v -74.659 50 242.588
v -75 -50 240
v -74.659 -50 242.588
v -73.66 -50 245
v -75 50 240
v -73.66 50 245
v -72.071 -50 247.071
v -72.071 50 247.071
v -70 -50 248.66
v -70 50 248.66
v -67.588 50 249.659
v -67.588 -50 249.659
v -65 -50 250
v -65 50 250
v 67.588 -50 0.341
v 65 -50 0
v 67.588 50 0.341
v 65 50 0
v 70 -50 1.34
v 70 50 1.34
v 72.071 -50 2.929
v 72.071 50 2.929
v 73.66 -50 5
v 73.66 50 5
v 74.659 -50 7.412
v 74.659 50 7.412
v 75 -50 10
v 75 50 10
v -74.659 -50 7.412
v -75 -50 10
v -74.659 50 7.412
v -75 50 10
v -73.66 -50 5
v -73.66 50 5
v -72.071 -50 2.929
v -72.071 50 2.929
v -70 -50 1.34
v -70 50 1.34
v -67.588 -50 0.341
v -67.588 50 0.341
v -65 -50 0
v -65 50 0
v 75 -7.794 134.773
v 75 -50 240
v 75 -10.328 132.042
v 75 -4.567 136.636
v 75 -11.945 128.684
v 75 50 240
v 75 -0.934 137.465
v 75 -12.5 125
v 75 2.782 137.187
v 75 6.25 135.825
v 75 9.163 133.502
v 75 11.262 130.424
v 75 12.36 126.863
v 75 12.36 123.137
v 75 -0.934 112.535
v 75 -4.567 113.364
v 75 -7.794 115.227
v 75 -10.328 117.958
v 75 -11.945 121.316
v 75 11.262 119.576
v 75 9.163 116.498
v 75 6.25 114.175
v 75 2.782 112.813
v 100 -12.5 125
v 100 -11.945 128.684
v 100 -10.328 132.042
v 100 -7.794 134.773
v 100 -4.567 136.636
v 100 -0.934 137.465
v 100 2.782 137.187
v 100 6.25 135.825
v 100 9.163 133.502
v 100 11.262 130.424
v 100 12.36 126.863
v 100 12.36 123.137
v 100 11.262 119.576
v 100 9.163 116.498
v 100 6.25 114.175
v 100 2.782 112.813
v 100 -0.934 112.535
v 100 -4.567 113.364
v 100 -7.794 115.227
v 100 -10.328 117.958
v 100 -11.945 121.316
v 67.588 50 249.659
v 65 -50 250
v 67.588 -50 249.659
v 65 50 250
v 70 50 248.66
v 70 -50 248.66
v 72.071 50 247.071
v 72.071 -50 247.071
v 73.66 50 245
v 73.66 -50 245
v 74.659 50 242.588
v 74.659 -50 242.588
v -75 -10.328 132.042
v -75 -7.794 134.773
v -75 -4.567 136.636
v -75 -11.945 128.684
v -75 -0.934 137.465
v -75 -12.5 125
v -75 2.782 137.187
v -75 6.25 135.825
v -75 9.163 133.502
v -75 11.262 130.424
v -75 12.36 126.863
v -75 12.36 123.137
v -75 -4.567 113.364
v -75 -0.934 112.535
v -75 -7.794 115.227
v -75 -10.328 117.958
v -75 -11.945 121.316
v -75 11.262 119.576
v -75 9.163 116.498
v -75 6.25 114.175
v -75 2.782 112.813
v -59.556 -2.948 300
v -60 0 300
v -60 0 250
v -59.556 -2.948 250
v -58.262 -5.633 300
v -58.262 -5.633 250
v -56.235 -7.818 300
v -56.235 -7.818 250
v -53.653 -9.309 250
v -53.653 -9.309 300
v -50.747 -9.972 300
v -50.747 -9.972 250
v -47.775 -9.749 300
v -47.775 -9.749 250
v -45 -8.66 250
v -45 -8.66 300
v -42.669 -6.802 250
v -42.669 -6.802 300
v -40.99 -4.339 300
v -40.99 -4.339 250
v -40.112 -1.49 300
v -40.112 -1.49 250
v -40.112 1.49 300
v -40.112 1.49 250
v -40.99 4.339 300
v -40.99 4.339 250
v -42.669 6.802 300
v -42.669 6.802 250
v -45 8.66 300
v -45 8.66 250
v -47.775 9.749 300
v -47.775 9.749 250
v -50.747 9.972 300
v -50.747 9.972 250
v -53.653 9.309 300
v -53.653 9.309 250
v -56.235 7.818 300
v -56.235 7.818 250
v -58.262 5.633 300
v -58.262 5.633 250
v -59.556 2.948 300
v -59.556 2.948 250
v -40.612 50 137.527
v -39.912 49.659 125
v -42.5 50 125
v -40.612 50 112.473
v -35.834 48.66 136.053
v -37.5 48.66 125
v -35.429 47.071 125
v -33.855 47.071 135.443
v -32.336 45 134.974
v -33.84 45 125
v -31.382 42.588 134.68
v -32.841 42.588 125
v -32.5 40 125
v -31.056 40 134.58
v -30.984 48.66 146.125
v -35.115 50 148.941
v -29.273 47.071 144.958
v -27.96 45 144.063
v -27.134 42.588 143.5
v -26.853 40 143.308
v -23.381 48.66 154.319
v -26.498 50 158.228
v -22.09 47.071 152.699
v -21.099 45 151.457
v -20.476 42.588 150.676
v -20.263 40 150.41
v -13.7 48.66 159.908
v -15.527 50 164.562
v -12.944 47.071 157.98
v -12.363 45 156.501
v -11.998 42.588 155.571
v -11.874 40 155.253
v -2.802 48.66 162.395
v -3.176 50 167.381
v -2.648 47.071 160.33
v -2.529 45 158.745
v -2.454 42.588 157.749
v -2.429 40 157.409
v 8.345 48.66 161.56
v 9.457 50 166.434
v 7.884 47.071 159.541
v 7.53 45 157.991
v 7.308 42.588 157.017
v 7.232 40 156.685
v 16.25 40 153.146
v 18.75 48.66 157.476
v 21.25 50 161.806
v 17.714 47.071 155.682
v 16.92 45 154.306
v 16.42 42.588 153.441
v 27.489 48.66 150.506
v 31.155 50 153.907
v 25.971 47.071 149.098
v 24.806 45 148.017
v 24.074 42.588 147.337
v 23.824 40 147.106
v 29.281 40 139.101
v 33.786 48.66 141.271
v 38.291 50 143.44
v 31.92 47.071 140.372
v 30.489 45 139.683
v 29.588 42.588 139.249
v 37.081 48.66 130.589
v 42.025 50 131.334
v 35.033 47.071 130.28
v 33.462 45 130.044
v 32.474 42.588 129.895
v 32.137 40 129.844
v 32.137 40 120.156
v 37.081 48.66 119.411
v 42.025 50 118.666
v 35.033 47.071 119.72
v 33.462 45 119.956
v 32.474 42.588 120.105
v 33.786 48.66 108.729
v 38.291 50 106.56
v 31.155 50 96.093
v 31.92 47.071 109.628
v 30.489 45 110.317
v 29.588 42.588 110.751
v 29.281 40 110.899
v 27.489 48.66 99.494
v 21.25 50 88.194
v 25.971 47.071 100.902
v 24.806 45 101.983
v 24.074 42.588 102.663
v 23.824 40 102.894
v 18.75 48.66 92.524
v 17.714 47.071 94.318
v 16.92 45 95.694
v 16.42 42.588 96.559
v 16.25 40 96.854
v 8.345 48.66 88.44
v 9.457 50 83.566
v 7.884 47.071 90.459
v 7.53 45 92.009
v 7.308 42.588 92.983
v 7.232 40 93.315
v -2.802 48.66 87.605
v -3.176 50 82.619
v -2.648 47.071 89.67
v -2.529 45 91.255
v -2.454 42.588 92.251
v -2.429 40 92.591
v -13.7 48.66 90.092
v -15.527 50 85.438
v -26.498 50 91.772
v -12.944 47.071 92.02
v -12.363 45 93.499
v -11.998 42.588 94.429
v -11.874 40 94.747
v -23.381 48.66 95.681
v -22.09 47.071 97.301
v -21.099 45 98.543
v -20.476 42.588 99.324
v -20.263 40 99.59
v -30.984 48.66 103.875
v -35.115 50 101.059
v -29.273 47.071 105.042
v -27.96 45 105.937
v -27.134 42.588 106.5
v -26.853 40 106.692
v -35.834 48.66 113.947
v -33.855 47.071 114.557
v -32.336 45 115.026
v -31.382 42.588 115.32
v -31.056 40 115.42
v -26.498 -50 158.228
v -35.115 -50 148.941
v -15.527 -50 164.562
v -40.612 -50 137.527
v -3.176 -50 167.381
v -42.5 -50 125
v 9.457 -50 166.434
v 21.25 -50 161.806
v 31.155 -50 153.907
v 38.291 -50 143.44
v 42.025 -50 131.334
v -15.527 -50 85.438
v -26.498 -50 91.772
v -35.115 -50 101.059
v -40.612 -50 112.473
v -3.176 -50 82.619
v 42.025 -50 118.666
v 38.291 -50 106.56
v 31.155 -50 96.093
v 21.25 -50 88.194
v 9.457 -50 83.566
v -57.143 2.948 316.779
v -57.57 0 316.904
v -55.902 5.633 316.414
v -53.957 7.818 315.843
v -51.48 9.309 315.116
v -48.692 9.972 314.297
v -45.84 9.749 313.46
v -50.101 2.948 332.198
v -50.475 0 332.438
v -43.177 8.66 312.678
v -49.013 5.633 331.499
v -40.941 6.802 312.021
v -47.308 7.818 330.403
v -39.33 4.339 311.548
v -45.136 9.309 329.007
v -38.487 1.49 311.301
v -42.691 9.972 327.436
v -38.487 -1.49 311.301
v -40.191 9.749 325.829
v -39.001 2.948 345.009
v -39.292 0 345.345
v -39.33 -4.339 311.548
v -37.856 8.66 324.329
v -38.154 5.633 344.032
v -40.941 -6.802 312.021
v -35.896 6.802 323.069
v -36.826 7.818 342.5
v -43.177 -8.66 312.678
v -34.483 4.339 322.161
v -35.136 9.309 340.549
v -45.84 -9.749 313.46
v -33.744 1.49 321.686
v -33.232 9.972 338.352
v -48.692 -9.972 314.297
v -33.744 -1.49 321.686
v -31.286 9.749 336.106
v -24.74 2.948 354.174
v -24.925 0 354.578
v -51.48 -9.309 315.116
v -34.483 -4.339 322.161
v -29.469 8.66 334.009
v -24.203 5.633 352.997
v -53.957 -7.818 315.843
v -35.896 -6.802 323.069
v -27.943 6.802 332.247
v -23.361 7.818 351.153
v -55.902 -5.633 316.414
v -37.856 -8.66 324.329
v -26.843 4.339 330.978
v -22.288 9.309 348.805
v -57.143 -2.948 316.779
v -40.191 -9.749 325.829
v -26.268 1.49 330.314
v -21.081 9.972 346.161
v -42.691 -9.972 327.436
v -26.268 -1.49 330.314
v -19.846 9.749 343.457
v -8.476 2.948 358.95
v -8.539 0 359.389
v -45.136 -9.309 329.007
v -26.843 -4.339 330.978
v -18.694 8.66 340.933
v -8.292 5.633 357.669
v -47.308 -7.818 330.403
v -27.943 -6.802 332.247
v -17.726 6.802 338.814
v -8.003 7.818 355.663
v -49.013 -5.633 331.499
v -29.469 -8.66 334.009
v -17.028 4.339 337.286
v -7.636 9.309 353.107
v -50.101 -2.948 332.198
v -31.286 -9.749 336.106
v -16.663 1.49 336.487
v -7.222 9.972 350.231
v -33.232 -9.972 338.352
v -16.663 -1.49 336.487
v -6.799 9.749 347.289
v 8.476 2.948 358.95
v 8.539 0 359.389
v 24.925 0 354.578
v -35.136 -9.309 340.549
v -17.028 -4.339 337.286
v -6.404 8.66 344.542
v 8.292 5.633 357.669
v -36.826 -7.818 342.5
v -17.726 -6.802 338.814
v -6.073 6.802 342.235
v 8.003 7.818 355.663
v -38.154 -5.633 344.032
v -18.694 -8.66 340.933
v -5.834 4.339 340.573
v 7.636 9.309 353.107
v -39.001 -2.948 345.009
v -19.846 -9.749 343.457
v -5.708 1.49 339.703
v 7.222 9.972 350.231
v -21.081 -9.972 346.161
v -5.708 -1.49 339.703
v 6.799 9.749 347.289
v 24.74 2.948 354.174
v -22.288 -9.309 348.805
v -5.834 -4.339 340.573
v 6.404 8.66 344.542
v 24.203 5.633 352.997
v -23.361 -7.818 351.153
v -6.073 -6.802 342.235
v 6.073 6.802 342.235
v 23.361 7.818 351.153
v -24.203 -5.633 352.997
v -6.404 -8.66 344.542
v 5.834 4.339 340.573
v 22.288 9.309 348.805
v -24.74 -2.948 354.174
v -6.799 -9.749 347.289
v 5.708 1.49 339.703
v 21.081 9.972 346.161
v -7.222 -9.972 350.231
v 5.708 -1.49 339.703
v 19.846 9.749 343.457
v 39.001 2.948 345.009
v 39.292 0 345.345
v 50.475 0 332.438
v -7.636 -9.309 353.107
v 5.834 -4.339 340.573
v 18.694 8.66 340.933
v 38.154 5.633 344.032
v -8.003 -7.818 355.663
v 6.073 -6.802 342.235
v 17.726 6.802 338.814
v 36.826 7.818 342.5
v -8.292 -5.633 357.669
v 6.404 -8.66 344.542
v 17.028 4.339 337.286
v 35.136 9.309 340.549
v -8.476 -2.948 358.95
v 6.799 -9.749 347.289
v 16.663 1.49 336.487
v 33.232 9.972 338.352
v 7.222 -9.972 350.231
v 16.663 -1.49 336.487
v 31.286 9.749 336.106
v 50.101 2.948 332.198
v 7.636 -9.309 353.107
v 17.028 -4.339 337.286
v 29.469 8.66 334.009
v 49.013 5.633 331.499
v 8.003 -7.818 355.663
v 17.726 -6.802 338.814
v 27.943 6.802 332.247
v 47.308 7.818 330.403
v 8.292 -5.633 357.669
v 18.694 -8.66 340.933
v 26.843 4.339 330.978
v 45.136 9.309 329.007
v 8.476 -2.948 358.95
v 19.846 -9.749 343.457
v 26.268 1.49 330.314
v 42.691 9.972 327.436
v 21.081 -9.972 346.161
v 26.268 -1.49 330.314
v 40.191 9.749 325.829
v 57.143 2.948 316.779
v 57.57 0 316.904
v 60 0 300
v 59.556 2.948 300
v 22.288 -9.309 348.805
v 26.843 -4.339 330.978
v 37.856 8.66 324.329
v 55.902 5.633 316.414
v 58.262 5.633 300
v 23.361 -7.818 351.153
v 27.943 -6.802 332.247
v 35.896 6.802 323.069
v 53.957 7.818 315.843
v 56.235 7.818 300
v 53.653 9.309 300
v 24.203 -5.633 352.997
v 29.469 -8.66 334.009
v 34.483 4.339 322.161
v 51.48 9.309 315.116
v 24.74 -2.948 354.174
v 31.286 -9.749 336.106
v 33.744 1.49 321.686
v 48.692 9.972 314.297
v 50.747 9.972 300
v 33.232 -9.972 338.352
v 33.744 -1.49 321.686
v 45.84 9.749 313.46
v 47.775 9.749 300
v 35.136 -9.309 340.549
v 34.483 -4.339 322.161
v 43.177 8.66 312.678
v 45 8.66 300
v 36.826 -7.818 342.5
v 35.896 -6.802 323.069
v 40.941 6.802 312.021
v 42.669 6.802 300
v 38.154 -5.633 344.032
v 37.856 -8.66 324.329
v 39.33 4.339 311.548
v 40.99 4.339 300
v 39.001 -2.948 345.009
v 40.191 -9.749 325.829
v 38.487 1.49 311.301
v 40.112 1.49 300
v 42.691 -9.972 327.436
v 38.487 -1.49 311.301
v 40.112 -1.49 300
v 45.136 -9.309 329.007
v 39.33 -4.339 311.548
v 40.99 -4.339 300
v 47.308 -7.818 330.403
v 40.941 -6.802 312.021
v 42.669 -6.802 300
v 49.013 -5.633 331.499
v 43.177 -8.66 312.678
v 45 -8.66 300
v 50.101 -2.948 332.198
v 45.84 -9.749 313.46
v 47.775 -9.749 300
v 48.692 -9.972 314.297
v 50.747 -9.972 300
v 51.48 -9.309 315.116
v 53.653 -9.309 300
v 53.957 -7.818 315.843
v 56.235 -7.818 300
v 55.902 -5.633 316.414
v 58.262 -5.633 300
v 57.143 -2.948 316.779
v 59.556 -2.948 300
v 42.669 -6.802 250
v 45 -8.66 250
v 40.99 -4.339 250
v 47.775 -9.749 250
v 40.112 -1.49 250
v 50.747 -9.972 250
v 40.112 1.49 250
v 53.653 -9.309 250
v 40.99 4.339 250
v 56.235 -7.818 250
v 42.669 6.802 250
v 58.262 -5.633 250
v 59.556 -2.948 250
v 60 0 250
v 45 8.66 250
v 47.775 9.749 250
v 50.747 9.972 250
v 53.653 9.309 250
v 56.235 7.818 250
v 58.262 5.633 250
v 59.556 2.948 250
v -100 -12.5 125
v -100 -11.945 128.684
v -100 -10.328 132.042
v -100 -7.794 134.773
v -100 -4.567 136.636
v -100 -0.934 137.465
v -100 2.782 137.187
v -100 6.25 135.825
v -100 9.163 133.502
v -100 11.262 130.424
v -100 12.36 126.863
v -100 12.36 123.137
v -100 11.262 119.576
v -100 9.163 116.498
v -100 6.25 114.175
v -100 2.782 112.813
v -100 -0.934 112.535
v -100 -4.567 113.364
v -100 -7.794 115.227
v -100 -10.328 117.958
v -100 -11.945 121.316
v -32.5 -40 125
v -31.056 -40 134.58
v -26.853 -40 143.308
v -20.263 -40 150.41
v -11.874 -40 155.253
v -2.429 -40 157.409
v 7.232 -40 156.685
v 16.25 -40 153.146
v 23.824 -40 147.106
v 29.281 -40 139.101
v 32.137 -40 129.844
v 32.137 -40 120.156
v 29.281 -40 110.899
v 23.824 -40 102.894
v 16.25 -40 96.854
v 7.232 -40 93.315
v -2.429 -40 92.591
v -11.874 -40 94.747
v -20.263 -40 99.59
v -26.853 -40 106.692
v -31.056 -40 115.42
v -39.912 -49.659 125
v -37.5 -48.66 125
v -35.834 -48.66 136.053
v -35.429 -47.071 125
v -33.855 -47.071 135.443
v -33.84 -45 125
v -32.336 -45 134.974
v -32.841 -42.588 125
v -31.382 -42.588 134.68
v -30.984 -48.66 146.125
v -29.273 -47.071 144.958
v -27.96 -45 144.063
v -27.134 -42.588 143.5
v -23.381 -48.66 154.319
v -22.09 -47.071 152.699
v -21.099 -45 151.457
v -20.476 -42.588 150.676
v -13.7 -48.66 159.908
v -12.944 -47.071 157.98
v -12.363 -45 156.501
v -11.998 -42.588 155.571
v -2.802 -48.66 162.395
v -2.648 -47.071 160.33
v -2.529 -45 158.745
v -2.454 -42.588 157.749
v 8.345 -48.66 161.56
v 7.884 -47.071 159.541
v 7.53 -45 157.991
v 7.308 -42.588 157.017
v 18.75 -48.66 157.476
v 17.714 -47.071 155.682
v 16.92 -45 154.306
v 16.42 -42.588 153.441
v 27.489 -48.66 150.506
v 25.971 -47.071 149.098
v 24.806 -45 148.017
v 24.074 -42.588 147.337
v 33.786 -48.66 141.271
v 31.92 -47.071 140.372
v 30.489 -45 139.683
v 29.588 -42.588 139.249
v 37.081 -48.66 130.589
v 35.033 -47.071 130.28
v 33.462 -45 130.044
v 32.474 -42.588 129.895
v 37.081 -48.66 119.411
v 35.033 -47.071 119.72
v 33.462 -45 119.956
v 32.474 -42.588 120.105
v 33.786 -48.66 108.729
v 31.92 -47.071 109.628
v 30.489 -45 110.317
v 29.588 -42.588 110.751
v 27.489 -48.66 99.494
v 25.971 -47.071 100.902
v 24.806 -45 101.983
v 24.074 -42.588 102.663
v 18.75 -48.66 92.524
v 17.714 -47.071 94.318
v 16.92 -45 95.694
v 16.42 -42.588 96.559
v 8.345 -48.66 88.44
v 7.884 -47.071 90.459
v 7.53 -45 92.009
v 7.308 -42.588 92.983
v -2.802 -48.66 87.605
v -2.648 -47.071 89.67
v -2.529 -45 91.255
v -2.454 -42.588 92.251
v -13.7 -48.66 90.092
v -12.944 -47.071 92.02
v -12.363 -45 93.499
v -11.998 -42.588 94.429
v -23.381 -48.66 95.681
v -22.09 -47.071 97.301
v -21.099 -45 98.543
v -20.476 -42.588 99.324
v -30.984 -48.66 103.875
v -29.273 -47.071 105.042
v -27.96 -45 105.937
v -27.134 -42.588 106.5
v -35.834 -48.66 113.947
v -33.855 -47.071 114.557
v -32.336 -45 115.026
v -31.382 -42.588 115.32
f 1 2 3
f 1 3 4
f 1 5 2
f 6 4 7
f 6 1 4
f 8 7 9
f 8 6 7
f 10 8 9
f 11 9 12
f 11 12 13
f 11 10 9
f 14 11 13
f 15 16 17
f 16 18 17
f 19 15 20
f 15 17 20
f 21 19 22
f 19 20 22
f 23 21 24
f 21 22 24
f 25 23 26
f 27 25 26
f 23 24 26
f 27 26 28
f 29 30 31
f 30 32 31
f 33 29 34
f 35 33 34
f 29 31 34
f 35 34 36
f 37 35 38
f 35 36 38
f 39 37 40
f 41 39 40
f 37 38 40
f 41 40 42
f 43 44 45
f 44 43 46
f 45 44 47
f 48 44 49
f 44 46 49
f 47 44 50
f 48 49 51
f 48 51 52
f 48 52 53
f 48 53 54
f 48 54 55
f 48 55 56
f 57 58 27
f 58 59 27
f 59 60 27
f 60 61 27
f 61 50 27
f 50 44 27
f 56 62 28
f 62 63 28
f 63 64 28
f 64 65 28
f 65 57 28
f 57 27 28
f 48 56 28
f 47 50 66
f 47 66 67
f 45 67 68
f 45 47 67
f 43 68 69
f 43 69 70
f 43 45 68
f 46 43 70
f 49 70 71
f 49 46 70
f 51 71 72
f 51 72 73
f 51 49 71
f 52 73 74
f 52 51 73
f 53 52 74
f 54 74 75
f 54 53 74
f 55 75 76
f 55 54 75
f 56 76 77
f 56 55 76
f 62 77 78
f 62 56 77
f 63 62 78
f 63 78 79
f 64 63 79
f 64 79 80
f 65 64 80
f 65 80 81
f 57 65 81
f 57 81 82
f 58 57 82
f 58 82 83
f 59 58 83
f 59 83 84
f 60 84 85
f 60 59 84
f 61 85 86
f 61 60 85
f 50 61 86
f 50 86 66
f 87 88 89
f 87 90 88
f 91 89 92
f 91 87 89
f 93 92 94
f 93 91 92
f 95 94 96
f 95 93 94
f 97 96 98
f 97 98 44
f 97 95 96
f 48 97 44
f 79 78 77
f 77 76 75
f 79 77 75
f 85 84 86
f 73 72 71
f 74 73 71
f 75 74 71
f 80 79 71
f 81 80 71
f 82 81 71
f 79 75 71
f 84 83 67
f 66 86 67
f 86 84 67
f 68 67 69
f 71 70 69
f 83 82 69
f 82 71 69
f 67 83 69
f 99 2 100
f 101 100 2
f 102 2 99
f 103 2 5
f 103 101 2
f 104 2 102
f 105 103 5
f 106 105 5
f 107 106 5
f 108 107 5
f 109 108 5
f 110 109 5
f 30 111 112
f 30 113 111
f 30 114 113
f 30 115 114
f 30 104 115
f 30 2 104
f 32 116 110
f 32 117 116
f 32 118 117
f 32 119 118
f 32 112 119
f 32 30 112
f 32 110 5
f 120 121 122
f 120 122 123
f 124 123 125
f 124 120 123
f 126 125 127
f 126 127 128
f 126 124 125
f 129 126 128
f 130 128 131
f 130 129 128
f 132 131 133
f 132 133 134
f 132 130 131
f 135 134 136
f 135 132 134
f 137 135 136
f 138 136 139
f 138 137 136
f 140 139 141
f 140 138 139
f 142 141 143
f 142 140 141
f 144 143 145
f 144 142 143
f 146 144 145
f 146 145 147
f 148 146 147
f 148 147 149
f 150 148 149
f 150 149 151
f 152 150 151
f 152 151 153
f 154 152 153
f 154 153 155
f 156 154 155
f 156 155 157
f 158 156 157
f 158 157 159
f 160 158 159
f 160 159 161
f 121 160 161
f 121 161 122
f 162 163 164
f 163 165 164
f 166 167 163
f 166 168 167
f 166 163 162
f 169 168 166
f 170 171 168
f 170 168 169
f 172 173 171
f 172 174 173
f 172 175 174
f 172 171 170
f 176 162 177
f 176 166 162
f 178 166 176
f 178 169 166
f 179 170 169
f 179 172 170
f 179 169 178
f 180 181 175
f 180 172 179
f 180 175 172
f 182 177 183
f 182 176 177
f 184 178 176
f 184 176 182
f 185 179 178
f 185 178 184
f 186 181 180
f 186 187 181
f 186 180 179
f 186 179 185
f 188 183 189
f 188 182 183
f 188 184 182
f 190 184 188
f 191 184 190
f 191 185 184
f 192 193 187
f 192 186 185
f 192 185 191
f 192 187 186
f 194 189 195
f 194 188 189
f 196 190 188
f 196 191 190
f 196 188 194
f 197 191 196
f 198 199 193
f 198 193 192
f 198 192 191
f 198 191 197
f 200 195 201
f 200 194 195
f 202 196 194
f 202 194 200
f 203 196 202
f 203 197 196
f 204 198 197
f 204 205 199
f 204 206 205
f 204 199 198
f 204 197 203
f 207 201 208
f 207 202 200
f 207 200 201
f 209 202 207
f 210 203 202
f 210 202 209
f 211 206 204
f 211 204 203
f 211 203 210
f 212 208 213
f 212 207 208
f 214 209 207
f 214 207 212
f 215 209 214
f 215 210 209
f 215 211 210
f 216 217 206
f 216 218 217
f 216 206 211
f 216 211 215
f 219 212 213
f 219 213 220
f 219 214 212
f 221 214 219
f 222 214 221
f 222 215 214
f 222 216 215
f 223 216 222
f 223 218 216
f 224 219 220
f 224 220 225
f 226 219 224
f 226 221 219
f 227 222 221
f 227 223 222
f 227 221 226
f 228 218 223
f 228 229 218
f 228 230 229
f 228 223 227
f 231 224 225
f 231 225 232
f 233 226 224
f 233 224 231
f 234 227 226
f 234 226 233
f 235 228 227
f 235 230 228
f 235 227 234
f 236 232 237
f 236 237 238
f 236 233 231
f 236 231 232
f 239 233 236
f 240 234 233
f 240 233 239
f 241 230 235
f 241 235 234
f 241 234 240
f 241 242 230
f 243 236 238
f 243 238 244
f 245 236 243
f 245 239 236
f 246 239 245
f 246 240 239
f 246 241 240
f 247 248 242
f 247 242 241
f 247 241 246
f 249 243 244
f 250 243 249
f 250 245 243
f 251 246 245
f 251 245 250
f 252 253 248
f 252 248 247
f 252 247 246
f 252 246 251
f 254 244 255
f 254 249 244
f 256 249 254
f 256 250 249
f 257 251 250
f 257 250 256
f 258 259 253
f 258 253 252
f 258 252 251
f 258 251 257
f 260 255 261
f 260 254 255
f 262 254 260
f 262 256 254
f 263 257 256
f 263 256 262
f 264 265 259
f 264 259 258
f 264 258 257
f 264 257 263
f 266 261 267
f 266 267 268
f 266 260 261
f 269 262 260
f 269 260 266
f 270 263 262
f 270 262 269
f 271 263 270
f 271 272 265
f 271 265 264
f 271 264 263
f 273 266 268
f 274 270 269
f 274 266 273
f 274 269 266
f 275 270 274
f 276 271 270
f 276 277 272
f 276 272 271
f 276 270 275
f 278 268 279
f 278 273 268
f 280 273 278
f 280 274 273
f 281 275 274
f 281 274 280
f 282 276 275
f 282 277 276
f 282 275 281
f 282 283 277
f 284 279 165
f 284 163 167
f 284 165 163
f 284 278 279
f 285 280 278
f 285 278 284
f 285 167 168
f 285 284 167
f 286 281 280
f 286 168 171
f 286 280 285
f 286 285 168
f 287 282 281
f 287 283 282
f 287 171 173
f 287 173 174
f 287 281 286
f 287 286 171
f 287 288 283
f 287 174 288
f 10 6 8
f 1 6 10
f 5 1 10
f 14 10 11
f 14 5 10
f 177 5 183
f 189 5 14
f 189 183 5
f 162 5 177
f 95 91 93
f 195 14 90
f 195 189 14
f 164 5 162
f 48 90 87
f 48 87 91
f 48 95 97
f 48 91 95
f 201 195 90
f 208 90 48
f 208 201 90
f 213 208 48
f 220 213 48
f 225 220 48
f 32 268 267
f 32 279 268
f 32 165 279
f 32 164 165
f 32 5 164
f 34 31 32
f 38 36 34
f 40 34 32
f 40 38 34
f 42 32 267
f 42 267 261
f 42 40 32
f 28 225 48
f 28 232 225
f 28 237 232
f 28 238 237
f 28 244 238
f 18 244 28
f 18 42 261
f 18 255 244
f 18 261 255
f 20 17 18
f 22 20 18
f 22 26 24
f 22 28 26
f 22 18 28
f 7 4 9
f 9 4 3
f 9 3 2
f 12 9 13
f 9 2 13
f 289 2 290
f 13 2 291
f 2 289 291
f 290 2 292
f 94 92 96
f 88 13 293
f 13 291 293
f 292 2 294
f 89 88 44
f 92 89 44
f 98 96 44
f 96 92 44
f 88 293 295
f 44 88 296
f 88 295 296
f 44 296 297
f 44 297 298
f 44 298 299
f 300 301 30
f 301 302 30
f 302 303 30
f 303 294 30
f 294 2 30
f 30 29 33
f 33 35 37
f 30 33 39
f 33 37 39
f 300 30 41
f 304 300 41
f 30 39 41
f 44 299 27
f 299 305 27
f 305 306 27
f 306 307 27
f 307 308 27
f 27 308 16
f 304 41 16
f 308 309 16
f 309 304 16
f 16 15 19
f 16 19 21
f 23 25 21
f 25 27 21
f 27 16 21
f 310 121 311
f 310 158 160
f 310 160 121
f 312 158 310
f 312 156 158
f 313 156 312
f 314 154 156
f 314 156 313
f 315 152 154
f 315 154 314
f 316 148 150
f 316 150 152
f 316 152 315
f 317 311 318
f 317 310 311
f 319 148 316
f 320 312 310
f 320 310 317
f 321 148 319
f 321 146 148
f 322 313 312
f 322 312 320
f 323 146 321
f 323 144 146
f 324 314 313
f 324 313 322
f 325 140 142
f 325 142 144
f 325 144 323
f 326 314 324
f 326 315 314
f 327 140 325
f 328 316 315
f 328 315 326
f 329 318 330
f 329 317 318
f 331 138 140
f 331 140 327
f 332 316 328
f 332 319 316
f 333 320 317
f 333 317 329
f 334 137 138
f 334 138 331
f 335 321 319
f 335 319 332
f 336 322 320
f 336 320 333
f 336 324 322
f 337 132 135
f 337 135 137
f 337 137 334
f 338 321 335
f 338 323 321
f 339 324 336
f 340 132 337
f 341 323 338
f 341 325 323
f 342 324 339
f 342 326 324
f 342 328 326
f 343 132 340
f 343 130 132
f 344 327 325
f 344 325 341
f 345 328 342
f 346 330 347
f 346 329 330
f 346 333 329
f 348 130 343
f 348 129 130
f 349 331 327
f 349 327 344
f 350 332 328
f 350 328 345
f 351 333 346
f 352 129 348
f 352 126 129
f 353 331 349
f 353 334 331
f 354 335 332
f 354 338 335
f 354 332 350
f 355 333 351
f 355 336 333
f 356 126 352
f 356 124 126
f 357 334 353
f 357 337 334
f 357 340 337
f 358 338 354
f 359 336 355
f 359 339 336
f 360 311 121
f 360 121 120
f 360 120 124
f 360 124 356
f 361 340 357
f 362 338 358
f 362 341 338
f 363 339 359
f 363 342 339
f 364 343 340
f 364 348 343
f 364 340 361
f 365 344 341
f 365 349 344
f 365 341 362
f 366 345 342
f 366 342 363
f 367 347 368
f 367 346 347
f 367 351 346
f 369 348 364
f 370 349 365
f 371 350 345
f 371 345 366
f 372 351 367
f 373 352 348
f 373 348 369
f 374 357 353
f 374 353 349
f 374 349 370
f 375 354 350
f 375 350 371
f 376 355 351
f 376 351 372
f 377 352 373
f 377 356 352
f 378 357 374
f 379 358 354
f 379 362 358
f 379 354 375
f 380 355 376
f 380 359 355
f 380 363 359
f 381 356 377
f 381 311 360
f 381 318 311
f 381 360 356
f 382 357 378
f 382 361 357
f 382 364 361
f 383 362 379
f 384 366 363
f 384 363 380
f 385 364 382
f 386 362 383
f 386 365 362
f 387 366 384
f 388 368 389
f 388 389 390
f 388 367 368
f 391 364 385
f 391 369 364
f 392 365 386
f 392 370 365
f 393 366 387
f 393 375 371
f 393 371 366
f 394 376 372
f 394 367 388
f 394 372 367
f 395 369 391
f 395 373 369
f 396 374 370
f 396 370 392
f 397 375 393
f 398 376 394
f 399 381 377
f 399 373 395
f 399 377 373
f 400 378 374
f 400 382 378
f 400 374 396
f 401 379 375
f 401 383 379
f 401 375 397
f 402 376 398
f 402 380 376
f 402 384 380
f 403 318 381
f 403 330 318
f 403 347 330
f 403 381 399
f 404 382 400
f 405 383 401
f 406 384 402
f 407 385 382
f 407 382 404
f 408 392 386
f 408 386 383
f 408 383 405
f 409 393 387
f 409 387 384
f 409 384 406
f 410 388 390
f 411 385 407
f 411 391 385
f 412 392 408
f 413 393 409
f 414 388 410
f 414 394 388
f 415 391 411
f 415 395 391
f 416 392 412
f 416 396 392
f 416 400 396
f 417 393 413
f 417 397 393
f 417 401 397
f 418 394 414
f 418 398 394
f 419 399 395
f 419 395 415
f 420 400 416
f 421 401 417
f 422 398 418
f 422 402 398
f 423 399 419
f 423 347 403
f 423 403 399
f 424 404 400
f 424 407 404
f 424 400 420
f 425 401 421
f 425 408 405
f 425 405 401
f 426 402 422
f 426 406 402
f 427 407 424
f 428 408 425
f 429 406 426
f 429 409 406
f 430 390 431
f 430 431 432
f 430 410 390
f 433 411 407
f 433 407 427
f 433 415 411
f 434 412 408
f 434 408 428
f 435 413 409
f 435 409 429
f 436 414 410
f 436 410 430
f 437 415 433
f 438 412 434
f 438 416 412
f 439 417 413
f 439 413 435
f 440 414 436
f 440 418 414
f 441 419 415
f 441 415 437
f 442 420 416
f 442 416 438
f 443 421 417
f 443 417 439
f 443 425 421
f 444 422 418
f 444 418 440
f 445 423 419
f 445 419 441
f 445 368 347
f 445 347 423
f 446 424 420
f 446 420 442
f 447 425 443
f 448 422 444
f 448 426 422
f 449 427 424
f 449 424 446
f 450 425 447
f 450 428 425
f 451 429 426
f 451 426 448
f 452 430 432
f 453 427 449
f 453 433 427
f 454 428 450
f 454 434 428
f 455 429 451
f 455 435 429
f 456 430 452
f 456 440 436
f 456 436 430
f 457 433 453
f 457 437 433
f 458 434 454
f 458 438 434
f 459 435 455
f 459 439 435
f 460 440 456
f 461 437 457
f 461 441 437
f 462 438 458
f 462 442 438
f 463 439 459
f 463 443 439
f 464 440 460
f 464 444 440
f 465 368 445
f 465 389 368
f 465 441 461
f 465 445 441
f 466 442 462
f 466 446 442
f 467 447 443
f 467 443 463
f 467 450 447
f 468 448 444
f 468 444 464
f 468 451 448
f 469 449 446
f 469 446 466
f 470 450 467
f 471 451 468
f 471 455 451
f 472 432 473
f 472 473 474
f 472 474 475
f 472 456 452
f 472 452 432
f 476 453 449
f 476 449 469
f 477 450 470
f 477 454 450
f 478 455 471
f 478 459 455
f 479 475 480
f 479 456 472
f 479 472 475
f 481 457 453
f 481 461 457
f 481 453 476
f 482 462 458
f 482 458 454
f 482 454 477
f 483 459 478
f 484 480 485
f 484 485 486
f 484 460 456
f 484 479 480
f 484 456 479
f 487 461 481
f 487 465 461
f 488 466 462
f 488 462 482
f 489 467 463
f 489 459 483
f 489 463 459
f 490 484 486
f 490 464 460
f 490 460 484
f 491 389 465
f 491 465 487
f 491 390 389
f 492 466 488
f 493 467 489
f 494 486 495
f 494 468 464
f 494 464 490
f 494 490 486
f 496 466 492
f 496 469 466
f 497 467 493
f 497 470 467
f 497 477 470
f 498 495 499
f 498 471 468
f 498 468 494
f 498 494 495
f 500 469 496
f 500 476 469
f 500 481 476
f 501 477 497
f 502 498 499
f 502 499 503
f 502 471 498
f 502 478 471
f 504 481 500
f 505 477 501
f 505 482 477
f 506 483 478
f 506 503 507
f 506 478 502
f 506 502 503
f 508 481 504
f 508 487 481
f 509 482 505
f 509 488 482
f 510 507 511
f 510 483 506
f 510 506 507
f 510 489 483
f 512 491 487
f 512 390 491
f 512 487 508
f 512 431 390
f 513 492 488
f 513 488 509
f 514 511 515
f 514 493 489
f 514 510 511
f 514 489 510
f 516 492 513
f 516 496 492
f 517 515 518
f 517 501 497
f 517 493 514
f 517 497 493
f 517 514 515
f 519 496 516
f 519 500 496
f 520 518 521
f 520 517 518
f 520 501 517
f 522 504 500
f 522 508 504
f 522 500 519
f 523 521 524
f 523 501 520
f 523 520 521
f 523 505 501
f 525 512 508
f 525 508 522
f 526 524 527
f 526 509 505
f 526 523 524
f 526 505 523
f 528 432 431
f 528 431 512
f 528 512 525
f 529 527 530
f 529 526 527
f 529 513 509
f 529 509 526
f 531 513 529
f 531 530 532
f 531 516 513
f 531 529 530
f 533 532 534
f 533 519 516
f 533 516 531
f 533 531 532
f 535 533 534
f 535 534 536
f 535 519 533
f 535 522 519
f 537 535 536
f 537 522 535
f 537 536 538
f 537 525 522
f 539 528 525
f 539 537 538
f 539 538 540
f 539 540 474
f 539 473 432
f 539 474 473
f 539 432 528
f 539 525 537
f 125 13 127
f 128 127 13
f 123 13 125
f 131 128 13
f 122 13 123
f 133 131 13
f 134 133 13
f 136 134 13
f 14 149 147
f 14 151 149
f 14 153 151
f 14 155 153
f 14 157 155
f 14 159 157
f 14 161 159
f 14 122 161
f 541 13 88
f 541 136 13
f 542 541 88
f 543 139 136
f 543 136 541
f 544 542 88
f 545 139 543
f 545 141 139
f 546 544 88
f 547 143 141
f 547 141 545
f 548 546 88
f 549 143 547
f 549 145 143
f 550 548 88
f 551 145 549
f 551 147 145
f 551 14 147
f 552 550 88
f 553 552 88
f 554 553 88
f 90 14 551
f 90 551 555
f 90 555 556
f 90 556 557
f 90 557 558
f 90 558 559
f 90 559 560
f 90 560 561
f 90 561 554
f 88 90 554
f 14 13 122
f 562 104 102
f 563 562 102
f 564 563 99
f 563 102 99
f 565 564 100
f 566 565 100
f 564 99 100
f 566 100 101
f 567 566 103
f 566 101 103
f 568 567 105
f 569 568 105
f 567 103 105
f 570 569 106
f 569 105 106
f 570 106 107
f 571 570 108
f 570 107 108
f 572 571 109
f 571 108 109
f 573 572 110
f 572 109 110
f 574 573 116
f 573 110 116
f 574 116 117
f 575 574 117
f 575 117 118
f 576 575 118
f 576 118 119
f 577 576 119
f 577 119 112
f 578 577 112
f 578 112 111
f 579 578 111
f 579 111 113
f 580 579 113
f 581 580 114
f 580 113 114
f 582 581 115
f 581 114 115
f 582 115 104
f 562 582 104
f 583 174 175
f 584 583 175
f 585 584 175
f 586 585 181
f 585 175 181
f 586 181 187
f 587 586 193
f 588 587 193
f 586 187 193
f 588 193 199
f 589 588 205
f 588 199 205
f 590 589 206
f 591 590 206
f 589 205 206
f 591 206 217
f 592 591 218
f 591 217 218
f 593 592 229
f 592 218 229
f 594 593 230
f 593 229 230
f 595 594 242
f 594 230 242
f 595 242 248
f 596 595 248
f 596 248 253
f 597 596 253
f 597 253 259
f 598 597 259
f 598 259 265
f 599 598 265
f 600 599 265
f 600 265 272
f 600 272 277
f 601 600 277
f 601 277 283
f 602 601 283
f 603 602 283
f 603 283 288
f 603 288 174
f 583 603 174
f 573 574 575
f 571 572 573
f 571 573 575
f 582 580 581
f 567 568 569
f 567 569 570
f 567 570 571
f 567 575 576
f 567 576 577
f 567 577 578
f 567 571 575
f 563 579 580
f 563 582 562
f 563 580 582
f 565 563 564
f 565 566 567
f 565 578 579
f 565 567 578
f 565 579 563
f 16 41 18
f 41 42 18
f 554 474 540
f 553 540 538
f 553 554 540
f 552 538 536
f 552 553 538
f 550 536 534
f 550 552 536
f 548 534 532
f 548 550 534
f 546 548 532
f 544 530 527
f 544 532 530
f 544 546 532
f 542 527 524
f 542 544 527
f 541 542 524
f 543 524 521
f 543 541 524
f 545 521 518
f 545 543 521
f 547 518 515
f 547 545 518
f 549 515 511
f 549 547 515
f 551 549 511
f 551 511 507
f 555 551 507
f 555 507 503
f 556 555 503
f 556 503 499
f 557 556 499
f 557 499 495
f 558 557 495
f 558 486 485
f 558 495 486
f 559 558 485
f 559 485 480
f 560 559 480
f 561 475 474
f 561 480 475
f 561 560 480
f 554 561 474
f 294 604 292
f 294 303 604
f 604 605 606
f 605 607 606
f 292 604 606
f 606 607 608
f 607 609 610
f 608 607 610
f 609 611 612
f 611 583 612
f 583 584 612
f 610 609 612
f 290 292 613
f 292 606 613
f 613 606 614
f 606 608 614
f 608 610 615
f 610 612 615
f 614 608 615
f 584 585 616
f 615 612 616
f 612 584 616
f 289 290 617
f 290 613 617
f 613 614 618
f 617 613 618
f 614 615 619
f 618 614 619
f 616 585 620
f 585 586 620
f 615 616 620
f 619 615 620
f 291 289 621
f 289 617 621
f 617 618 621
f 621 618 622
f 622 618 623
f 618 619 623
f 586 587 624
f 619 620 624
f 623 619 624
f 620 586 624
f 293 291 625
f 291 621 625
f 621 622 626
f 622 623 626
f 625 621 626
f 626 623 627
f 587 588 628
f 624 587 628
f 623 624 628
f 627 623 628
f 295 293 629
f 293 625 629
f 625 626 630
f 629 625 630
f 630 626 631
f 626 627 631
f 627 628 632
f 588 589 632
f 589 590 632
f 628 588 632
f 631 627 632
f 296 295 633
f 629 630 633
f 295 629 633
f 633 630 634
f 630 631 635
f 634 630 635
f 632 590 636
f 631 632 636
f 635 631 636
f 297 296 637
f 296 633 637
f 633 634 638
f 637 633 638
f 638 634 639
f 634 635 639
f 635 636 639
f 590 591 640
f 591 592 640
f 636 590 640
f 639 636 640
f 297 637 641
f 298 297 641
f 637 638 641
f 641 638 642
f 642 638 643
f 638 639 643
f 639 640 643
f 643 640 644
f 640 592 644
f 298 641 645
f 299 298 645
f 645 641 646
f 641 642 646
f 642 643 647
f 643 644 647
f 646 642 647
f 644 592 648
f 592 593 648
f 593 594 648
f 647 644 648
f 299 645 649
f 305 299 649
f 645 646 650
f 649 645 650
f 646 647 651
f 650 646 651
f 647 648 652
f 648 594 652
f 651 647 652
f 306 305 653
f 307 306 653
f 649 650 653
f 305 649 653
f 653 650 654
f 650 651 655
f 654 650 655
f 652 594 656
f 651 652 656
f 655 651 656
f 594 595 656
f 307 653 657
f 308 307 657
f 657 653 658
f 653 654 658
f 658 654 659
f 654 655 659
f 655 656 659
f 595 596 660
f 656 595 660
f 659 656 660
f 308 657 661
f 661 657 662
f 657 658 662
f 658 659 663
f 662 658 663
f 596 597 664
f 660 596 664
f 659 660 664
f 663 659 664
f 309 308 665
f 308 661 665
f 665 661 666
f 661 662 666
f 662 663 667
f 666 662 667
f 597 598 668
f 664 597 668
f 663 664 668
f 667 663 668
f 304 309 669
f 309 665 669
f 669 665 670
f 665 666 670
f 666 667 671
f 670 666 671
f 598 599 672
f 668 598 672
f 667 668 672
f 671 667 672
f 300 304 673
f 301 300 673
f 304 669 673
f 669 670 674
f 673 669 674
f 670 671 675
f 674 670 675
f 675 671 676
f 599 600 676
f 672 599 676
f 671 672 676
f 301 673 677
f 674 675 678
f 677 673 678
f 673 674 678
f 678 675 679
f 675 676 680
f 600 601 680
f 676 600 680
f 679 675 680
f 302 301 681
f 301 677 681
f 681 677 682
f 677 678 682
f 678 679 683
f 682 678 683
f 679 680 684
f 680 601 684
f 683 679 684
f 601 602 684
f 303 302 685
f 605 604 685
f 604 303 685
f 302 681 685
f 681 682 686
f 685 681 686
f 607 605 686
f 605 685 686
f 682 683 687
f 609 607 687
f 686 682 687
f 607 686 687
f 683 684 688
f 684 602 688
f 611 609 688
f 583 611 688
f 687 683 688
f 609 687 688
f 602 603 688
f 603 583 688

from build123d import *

# Parameters (mm, degrees)
F0_W     = 150
F0_H     = 100
F1_DEPTH = 250
F2_R     = 32.5
F3_DEPTH = 100.001
F4_R     = 10
F5_R     = 12.5
F6_DEPTH = 25
F7_R     = 10


# Not quite as in the source:
# - a pattern or mirror of a feature is missing from the dataset's text; its kind, count and spacing are read off the source's solid


with BuildPart() as f1:
    # F0 (on Top) → F1 (new body)
    with BuildSketch(Plane.XY):
        Rectangle(F0_W, F0_H)
    extrude(amount=F1_DEPTH)

    # F2 (on face) → F3 (cut, through all)
    with BuildSketch(Plane(origin=(0, 50, 0), x_dir=(-1, 0, 0), z_dir=(0, 1, 0))):
        with Locations((0, 125)):
            Circle(F2_R)
    extrude(amount=-F3_DEPTH, mode=Mode.SUBTRACT)

    # F4
    f4_edges = [f1.edges().sort_by_distance(p)[0] for p in [
        (-75, 0, 250),
        (75, 0, 250),
        (75, 0, 0),
        (-75, 0, 0),
        (32.5, -50, 125),
        (32.5, 50, 125),
    ]]
    fillet(f4_edges, radius=F4_R)

    # F5 (on face) → F6 (join)
    with BuildSketch(Plane(origin=(-75, 0, 0), x_dir=(0, -1, 0), z_dir=(-1, 0, 0))):
        with Locations((0, 125)):
            Circle(F5_R)
    f6 = extrude(amount=F6_DEPTH)

    # F6_copies: F6 across plane
    add(f6.mirror(Plane(origin=(0, 0, 0), x_dir=(0, 0, 1), z_dir=(1, 0, 0))))

    # F9: sweep along a path in F8
    with BuildLine(Plane.XZ) as f9_path:
        Line((-50, 250), (-50, 300))
        ThreePointArc((-50, 300), (0, 350), (50, 300))
        Line((50, 300), (50, 250))
    # F7 (on face) → F9 (sweep)
    with BuildSketch(Plane.XY.offset(250)):
        with Locations((50, 0)):
            Circle(F7_R)
    sweep(path=f9_path.line)


solid = f1.part
